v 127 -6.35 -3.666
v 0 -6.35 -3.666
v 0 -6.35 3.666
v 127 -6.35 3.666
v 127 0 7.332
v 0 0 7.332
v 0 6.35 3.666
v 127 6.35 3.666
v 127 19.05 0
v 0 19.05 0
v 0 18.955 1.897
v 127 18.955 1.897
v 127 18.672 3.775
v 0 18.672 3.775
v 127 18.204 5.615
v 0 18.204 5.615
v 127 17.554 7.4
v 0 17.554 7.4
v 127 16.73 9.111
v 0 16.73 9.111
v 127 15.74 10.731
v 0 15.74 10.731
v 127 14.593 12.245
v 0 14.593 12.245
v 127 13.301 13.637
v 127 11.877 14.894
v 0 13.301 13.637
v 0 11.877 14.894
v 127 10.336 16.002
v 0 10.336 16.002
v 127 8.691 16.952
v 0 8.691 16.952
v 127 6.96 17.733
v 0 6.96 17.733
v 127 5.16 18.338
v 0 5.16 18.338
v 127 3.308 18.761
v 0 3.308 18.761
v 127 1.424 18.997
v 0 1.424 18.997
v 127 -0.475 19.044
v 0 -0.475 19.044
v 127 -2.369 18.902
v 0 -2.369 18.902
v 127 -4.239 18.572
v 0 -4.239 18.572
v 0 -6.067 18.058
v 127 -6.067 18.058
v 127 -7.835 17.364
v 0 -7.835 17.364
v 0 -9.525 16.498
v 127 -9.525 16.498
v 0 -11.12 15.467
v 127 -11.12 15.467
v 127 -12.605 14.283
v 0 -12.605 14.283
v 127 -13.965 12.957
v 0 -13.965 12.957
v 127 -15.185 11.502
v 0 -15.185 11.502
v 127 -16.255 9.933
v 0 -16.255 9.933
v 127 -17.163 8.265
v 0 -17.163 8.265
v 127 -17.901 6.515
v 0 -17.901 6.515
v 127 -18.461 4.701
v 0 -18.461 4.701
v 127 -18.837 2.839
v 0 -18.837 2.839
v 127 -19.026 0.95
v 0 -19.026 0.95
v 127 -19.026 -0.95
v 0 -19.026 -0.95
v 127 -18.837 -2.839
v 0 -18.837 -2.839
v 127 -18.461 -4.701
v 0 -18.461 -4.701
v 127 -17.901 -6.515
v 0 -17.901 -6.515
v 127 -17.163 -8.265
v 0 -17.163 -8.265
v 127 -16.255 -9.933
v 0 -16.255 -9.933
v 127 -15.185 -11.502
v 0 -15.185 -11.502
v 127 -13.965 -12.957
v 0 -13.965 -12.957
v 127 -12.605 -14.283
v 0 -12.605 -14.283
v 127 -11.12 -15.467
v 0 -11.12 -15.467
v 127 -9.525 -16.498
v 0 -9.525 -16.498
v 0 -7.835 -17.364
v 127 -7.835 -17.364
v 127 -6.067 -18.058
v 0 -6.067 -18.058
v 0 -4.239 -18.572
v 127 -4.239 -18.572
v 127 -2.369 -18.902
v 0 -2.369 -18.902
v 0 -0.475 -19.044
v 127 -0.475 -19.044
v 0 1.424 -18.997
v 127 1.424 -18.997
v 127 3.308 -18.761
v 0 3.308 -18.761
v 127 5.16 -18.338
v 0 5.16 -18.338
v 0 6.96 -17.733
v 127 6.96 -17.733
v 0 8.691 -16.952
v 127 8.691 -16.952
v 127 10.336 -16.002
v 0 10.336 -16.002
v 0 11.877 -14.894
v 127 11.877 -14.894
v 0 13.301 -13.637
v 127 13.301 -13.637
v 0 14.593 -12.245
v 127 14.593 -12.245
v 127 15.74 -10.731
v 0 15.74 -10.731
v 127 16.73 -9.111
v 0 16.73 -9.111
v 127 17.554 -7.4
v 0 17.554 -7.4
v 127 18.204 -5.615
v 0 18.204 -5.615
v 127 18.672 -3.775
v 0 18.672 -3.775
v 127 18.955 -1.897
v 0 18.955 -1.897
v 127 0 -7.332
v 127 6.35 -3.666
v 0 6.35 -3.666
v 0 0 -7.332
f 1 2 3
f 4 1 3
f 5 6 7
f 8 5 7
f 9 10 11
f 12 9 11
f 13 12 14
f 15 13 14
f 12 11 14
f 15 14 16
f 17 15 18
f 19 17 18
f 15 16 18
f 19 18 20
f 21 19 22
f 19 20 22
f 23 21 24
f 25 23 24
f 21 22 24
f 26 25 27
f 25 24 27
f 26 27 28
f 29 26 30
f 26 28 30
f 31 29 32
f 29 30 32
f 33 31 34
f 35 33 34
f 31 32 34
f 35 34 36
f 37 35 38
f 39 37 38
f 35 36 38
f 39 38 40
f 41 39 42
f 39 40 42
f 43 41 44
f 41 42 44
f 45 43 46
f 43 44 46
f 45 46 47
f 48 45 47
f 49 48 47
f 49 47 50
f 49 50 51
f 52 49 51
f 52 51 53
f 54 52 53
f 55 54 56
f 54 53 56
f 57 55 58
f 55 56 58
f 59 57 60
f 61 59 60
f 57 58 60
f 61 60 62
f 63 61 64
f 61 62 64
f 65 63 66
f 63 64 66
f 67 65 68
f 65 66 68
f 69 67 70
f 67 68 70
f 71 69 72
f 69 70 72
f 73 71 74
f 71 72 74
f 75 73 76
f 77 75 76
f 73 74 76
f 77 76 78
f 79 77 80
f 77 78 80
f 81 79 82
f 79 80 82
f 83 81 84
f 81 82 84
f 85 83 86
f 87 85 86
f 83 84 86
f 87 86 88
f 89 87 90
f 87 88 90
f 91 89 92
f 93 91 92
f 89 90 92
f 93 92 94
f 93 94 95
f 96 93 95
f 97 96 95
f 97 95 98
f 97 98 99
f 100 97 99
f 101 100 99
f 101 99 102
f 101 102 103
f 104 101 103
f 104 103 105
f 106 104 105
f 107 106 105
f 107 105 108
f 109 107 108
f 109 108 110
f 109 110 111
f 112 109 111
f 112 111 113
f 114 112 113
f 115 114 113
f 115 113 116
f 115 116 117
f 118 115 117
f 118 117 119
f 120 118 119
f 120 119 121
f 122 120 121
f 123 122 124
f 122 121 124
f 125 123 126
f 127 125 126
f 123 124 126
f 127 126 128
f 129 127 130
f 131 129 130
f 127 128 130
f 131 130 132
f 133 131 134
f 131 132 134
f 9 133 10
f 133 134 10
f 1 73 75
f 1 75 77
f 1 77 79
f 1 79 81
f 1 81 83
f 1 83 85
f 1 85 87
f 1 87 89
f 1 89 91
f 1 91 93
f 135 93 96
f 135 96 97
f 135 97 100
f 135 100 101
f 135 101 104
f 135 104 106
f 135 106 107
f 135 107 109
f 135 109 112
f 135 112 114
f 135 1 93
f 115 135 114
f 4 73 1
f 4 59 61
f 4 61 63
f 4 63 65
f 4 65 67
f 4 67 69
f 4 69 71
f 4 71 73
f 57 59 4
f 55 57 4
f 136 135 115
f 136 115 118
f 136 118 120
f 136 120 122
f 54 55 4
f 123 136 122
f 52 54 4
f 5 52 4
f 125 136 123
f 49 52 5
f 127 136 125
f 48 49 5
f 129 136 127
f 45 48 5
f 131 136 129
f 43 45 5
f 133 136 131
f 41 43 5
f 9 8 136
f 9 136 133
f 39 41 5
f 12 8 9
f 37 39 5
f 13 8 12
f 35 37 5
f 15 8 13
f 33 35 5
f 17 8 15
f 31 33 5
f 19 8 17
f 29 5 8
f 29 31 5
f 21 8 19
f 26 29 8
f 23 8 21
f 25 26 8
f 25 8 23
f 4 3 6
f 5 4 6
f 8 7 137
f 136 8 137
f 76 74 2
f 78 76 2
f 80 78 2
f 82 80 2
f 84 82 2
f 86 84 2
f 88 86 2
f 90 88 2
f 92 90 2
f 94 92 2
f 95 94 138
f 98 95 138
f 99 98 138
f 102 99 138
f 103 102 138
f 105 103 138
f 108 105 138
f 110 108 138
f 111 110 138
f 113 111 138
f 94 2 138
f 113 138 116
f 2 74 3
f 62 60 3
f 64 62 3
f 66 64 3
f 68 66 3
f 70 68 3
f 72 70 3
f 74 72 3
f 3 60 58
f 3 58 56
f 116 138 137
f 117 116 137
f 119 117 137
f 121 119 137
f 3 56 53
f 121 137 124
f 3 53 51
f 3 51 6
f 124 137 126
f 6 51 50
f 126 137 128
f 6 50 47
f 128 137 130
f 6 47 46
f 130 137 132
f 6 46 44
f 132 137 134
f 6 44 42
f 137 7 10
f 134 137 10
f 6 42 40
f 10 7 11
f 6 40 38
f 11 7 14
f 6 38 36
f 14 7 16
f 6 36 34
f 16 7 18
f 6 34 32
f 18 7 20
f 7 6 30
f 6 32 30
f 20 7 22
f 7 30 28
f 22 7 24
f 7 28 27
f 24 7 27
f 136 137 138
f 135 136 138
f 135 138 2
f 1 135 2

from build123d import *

# Parameters (mm, degrees)
F0_R     = 19.05
F1_DEPTH = 127


with BuildPart() as f1:
    # F0 (on Right) → F1 (new body)
    with BuildSketch(Plane.YZ):
        Circle(F0_R)
        Polygon((-6.35, 3.666174), (0, 7.332348), (6.35, 3.666174), (6.35, -3.666174), (0, -7.332348), (-6.35, -3.666174), align=None, mode=Mode.SUBTRACT)
    extrude(amount=F1_DEPTH)


solid = f1.part
